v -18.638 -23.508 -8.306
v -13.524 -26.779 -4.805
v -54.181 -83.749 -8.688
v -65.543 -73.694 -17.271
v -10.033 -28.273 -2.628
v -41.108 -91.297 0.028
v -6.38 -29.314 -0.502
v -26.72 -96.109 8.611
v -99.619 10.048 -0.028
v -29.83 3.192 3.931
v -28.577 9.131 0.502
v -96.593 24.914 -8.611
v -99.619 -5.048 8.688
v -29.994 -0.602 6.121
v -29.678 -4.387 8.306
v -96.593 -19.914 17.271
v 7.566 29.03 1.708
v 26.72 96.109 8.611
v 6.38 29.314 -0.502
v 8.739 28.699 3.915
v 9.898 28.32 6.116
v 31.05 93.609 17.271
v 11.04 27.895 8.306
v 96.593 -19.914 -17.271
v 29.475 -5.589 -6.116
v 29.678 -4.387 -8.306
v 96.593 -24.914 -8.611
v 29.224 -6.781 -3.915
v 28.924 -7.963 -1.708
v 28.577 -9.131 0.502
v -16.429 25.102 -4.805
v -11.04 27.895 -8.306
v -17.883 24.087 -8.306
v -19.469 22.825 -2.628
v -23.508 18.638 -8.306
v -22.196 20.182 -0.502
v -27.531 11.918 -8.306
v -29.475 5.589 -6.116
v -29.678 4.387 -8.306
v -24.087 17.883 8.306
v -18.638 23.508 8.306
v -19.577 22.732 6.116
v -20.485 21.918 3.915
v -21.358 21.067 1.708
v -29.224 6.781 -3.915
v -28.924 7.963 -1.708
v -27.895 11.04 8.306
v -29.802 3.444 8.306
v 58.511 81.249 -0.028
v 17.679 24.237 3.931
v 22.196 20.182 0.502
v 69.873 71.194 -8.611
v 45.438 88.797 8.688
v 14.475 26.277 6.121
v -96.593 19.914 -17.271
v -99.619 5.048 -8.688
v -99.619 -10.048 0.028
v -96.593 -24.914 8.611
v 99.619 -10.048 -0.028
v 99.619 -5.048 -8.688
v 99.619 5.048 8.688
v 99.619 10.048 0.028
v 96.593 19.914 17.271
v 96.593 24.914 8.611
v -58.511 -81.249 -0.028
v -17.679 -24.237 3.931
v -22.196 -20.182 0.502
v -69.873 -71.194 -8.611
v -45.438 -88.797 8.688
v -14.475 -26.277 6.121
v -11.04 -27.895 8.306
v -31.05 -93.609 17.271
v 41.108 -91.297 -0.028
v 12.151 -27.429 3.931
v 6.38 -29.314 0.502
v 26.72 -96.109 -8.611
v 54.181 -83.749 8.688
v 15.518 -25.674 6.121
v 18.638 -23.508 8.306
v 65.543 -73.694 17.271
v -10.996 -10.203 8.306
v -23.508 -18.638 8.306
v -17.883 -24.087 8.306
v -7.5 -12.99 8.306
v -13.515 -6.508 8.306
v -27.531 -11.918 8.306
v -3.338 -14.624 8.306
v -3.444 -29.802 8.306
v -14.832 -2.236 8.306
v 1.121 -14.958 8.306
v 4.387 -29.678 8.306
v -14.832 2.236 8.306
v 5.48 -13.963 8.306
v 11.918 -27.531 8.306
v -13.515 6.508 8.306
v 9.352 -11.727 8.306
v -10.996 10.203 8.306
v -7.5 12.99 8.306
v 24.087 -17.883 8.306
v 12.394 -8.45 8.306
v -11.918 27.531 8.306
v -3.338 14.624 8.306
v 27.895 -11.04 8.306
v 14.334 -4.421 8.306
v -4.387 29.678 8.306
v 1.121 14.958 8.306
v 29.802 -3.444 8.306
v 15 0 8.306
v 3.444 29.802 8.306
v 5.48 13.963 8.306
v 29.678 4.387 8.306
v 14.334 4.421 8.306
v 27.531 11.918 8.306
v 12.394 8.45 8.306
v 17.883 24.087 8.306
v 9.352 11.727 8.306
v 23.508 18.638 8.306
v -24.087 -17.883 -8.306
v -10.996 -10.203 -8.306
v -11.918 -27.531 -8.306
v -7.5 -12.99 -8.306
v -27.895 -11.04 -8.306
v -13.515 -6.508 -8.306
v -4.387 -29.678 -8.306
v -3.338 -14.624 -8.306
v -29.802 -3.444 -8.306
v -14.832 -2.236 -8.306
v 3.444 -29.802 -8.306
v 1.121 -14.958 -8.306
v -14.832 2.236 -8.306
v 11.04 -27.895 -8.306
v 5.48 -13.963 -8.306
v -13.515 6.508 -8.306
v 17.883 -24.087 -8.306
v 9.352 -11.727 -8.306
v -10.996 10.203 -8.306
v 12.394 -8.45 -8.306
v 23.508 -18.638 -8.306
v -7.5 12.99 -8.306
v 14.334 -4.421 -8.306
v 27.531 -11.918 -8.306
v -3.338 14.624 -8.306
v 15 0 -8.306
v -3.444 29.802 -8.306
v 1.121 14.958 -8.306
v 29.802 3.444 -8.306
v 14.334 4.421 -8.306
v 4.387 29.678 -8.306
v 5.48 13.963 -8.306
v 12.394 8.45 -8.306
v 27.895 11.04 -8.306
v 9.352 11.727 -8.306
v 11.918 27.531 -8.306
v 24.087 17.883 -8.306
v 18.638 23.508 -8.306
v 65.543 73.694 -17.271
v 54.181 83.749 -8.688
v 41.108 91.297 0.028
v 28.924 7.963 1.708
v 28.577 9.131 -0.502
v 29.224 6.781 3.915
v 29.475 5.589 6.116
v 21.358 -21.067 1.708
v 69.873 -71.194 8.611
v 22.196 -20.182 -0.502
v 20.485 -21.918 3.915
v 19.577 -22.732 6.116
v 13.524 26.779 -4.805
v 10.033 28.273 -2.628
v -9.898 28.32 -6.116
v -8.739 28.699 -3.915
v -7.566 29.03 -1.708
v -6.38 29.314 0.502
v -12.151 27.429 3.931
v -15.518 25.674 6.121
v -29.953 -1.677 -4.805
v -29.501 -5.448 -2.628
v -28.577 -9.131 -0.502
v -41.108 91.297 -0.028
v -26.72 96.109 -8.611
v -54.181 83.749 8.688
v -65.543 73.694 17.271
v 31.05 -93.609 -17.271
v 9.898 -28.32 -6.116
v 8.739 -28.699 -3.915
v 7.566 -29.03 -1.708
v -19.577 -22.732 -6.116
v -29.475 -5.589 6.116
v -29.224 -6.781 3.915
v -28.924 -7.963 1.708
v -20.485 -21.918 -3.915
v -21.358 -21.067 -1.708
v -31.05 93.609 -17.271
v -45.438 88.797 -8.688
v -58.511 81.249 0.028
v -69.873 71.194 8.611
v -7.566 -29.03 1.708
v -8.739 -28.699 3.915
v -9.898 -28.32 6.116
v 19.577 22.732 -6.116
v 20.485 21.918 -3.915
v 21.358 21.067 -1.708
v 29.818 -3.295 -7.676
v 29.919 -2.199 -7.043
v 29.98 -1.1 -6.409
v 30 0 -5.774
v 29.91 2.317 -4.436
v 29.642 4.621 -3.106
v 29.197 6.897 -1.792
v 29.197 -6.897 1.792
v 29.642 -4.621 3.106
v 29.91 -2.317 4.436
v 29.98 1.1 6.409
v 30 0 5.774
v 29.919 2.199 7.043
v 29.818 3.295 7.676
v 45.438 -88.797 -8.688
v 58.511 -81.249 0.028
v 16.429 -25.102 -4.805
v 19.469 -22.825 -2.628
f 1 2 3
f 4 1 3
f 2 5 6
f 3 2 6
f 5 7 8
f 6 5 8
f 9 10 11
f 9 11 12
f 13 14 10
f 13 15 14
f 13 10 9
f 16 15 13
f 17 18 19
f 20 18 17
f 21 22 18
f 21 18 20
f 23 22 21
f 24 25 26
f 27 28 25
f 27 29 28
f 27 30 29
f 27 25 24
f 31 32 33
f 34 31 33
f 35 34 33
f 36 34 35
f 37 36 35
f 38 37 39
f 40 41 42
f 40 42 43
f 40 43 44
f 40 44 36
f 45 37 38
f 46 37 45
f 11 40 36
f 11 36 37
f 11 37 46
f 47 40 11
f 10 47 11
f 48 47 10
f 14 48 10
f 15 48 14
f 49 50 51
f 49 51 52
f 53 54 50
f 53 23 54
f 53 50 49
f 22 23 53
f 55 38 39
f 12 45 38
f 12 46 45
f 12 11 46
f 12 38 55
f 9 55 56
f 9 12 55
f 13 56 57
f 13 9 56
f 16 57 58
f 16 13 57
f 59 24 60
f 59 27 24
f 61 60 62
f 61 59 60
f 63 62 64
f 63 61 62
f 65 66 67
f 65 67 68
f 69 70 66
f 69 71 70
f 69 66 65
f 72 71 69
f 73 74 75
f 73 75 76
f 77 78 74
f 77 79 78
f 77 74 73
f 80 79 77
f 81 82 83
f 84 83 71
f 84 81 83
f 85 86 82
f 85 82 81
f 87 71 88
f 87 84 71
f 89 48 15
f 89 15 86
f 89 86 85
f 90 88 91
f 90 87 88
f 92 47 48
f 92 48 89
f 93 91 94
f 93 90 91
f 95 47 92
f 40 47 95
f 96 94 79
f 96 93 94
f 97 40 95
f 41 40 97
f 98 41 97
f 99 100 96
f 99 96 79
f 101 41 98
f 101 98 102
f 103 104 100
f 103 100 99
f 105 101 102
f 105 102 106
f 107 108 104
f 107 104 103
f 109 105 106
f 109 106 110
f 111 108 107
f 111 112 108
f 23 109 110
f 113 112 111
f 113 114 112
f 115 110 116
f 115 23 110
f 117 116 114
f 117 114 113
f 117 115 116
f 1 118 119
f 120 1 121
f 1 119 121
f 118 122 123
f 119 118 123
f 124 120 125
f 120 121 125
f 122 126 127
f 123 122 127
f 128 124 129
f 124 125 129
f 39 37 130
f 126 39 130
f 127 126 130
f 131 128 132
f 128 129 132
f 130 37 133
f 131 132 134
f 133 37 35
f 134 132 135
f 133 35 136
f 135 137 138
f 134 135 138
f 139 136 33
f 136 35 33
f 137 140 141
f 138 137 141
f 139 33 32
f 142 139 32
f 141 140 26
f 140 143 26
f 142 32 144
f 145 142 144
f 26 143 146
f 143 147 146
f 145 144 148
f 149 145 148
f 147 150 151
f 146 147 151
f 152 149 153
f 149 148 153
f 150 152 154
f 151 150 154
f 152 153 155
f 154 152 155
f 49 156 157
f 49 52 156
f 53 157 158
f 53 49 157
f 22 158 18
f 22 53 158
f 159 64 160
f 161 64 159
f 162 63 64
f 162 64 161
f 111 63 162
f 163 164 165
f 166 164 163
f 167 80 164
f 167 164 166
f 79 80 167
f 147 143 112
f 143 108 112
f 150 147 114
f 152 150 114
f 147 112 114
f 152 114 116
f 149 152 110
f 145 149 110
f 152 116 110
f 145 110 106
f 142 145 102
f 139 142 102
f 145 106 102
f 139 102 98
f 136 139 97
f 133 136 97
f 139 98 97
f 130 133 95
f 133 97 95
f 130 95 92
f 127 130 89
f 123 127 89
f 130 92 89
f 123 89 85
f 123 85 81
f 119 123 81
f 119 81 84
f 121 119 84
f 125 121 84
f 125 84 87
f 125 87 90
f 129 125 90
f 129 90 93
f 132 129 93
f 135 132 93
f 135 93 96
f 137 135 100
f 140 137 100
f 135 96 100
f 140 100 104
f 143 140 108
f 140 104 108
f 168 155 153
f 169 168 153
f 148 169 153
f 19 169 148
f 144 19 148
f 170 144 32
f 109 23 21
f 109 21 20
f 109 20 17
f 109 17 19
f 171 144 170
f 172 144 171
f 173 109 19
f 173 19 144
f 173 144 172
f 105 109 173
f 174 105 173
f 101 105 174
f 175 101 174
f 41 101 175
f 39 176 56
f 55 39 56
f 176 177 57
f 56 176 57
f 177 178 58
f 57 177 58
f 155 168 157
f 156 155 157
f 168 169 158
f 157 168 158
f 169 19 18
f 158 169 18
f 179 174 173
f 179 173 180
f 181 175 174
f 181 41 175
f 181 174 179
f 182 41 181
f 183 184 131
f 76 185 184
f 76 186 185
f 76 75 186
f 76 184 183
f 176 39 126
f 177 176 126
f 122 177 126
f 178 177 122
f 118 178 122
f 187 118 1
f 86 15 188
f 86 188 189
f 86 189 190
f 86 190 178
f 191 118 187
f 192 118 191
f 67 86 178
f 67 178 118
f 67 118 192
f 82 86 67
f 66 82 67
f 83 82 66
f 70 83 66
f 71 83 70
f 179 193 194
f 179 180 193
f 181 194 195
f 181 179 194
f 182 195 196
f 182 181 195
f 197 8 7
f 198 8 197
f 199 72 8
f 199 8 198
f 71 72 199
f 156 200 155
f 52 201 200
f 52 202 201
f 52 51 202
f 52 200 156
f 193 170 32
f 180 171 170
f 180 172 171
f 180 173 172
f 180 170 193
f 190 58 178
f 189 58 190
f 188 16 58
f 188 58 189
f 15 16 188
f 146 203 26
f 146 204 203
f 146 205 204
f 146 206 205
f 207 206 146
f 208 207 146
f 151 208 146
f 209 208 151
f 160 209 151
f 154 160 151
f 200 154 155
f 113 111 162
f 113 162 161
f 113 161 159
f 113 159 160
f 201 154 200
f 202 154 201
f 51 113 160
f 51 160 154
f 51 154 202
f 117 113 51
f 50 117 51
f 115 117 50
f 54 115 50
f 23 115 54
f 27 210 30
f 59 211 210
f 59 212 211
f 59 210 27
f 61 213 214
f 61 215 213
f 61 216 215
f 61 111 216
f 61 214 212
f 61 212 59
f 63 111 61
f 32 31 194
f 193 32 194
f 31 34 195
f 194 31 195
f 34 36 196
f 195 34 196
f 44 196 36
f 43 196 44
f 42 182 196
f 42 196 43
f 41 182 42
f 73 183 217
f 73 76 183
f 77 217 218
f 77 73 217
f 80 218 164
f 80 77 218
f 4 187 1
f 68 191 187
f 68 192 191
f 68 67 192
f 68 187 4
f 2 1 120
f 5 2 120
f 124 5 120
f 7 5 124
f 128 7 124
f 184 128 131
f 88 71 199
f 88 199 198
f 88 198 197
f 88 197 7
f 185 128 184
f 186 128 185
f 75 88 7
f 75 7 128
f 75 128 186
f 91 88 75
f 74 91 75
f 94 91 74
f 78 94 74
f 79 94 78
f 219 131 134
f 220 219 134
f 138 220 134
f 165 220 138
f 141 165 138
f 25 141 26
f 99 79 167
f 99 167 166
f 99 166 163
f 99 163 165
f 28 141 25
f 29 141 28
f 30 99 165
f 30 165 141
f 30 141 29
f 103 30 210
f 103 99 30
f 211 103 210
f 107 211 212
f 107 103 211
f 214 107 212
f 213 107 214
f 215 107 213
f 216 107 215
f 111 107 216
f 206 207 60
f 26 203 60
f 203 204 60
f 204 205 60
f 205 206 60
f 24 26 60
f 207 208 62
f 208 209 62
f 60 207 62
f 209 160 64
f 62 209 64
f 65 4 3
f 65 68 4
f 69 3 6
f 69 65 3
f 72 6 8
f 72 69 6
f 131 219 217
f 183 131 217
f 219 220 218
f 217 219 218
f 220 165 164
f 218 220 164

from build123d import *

# Parameters (mm, degrees)
F1_DEPTH  = 5
F2_ANGLE  = 30
F4_COUNT  = 6
F5_R      = 30
F6_DEPTH  = 12.5
F11_DEPTH = 4.1938354
F12_R     = 15
F13_DEPTH = 12.5


# Not quite as in the source:
# - an extrude ends at something that could not be found from the text; its depth is read off the source's solid
# - a feature of the source that left no trace in its solid (it failed there, or was rolled back) is left out
# - a pattern or mirror of a feature is missing from the dataset's text; its kind, count and spacing are read off the source's solid


with BuildPart() as f1:
    # F0 (on Top) → F1 (new body, symmetric)
    with BuildSketch(Plane.XY):
        with BuildLine():
            Line((96.5925826289, 25.8819045103), (0, 0))
            Line((0, 0), (96.5925826289, -25.8819045103))
            ThreePointArc((96.5925826289, -25.8819045103), (100, 0), (96.5925826289, 25.8819045103))
        make_face()
    extrude(amount=F1_DEPTH, both=True)


with BuildPart() as f1_1:
    # F2: moved
    add(f1.part.rotate(Axis((70.1462253928, 0, 0), (1, 0, 0)), F2_ANGLE))


with BuildPart() as f4_1:
    # F4: instance of F1
    add(f1_1.part.rotate(Axis((0, 0, 33.6874611676), (0, 0, 1)), 1 * 360 / F4_COUNT))


with BuildPart() as f4_2:
    # F4: instance of F1
    add(f1_1.part.rotate(Axis((0, 0, 33.6874611676), (0, 0, 1)), 2 * 360 / F4_COUNT))


with BuildPart() as f4_3:
    # F4: instance of F1
    add(f1_1.part.rotate(Axis((0, 0, 33.6874611676), (0, 0, 1)), 3 * 360 / F4_COUNT))


with BuildPart() as f4_4:
    # F4: instance of F1
    add(f1_1.part.rotate(Axis((0, 0, 33.6874611676), (0, 0, 1)), 4 * 360 / F4_COUNT))


with BuildPart() as f4_5:
    # F4: instance of F1
    add(f1_1.part.rotate(Axis((0, 0, 33.6874611676), (0, 0, 1)), 5 * 360 / F4_COUNT))


with BuildPart() as f1_2:
    add(f1_1.part)

    add(f4_1.part)  # F6 merges F4_1

    add(f4_2.part)  # F6 merges F4_2

    add(f4_3.part)  # F6 merges F4_3

    add(f4_4.part)  # F6 merges F4_4

    add(f4_5.part)  # F6 merges F4_5
    # F5 (on Top) → F6 (join, symmetric)
    with BuildSketch(Plane.XY):
        Circle(F5_R)
    extrude(amount=F6_DEPTH, both=True)

    # F11 (cut, through all): a face of the model
    f11_faces = [f1_2.faces().sort_by_distance(p)[0] for p in [
        (0, 0, -12.5),
    ]]
    f11 = extrude(f11_faces, amount=-F11_DEPTH, mode=Mode.SUBTRACT)

    # F11_copies: F11 across plane
    add(f11.mirror(Plane.XY), mode=Mode.SUBTRACT)

    # F12 (on Top) → F13 (cut, symmetric)
    with BuildSketch(Plane.XY):
        Circle(F12_R)
    extrude(amount=F13_DEPTH, both=True, mode=Mode.SUBTRACT)


solid = f1_2.part
